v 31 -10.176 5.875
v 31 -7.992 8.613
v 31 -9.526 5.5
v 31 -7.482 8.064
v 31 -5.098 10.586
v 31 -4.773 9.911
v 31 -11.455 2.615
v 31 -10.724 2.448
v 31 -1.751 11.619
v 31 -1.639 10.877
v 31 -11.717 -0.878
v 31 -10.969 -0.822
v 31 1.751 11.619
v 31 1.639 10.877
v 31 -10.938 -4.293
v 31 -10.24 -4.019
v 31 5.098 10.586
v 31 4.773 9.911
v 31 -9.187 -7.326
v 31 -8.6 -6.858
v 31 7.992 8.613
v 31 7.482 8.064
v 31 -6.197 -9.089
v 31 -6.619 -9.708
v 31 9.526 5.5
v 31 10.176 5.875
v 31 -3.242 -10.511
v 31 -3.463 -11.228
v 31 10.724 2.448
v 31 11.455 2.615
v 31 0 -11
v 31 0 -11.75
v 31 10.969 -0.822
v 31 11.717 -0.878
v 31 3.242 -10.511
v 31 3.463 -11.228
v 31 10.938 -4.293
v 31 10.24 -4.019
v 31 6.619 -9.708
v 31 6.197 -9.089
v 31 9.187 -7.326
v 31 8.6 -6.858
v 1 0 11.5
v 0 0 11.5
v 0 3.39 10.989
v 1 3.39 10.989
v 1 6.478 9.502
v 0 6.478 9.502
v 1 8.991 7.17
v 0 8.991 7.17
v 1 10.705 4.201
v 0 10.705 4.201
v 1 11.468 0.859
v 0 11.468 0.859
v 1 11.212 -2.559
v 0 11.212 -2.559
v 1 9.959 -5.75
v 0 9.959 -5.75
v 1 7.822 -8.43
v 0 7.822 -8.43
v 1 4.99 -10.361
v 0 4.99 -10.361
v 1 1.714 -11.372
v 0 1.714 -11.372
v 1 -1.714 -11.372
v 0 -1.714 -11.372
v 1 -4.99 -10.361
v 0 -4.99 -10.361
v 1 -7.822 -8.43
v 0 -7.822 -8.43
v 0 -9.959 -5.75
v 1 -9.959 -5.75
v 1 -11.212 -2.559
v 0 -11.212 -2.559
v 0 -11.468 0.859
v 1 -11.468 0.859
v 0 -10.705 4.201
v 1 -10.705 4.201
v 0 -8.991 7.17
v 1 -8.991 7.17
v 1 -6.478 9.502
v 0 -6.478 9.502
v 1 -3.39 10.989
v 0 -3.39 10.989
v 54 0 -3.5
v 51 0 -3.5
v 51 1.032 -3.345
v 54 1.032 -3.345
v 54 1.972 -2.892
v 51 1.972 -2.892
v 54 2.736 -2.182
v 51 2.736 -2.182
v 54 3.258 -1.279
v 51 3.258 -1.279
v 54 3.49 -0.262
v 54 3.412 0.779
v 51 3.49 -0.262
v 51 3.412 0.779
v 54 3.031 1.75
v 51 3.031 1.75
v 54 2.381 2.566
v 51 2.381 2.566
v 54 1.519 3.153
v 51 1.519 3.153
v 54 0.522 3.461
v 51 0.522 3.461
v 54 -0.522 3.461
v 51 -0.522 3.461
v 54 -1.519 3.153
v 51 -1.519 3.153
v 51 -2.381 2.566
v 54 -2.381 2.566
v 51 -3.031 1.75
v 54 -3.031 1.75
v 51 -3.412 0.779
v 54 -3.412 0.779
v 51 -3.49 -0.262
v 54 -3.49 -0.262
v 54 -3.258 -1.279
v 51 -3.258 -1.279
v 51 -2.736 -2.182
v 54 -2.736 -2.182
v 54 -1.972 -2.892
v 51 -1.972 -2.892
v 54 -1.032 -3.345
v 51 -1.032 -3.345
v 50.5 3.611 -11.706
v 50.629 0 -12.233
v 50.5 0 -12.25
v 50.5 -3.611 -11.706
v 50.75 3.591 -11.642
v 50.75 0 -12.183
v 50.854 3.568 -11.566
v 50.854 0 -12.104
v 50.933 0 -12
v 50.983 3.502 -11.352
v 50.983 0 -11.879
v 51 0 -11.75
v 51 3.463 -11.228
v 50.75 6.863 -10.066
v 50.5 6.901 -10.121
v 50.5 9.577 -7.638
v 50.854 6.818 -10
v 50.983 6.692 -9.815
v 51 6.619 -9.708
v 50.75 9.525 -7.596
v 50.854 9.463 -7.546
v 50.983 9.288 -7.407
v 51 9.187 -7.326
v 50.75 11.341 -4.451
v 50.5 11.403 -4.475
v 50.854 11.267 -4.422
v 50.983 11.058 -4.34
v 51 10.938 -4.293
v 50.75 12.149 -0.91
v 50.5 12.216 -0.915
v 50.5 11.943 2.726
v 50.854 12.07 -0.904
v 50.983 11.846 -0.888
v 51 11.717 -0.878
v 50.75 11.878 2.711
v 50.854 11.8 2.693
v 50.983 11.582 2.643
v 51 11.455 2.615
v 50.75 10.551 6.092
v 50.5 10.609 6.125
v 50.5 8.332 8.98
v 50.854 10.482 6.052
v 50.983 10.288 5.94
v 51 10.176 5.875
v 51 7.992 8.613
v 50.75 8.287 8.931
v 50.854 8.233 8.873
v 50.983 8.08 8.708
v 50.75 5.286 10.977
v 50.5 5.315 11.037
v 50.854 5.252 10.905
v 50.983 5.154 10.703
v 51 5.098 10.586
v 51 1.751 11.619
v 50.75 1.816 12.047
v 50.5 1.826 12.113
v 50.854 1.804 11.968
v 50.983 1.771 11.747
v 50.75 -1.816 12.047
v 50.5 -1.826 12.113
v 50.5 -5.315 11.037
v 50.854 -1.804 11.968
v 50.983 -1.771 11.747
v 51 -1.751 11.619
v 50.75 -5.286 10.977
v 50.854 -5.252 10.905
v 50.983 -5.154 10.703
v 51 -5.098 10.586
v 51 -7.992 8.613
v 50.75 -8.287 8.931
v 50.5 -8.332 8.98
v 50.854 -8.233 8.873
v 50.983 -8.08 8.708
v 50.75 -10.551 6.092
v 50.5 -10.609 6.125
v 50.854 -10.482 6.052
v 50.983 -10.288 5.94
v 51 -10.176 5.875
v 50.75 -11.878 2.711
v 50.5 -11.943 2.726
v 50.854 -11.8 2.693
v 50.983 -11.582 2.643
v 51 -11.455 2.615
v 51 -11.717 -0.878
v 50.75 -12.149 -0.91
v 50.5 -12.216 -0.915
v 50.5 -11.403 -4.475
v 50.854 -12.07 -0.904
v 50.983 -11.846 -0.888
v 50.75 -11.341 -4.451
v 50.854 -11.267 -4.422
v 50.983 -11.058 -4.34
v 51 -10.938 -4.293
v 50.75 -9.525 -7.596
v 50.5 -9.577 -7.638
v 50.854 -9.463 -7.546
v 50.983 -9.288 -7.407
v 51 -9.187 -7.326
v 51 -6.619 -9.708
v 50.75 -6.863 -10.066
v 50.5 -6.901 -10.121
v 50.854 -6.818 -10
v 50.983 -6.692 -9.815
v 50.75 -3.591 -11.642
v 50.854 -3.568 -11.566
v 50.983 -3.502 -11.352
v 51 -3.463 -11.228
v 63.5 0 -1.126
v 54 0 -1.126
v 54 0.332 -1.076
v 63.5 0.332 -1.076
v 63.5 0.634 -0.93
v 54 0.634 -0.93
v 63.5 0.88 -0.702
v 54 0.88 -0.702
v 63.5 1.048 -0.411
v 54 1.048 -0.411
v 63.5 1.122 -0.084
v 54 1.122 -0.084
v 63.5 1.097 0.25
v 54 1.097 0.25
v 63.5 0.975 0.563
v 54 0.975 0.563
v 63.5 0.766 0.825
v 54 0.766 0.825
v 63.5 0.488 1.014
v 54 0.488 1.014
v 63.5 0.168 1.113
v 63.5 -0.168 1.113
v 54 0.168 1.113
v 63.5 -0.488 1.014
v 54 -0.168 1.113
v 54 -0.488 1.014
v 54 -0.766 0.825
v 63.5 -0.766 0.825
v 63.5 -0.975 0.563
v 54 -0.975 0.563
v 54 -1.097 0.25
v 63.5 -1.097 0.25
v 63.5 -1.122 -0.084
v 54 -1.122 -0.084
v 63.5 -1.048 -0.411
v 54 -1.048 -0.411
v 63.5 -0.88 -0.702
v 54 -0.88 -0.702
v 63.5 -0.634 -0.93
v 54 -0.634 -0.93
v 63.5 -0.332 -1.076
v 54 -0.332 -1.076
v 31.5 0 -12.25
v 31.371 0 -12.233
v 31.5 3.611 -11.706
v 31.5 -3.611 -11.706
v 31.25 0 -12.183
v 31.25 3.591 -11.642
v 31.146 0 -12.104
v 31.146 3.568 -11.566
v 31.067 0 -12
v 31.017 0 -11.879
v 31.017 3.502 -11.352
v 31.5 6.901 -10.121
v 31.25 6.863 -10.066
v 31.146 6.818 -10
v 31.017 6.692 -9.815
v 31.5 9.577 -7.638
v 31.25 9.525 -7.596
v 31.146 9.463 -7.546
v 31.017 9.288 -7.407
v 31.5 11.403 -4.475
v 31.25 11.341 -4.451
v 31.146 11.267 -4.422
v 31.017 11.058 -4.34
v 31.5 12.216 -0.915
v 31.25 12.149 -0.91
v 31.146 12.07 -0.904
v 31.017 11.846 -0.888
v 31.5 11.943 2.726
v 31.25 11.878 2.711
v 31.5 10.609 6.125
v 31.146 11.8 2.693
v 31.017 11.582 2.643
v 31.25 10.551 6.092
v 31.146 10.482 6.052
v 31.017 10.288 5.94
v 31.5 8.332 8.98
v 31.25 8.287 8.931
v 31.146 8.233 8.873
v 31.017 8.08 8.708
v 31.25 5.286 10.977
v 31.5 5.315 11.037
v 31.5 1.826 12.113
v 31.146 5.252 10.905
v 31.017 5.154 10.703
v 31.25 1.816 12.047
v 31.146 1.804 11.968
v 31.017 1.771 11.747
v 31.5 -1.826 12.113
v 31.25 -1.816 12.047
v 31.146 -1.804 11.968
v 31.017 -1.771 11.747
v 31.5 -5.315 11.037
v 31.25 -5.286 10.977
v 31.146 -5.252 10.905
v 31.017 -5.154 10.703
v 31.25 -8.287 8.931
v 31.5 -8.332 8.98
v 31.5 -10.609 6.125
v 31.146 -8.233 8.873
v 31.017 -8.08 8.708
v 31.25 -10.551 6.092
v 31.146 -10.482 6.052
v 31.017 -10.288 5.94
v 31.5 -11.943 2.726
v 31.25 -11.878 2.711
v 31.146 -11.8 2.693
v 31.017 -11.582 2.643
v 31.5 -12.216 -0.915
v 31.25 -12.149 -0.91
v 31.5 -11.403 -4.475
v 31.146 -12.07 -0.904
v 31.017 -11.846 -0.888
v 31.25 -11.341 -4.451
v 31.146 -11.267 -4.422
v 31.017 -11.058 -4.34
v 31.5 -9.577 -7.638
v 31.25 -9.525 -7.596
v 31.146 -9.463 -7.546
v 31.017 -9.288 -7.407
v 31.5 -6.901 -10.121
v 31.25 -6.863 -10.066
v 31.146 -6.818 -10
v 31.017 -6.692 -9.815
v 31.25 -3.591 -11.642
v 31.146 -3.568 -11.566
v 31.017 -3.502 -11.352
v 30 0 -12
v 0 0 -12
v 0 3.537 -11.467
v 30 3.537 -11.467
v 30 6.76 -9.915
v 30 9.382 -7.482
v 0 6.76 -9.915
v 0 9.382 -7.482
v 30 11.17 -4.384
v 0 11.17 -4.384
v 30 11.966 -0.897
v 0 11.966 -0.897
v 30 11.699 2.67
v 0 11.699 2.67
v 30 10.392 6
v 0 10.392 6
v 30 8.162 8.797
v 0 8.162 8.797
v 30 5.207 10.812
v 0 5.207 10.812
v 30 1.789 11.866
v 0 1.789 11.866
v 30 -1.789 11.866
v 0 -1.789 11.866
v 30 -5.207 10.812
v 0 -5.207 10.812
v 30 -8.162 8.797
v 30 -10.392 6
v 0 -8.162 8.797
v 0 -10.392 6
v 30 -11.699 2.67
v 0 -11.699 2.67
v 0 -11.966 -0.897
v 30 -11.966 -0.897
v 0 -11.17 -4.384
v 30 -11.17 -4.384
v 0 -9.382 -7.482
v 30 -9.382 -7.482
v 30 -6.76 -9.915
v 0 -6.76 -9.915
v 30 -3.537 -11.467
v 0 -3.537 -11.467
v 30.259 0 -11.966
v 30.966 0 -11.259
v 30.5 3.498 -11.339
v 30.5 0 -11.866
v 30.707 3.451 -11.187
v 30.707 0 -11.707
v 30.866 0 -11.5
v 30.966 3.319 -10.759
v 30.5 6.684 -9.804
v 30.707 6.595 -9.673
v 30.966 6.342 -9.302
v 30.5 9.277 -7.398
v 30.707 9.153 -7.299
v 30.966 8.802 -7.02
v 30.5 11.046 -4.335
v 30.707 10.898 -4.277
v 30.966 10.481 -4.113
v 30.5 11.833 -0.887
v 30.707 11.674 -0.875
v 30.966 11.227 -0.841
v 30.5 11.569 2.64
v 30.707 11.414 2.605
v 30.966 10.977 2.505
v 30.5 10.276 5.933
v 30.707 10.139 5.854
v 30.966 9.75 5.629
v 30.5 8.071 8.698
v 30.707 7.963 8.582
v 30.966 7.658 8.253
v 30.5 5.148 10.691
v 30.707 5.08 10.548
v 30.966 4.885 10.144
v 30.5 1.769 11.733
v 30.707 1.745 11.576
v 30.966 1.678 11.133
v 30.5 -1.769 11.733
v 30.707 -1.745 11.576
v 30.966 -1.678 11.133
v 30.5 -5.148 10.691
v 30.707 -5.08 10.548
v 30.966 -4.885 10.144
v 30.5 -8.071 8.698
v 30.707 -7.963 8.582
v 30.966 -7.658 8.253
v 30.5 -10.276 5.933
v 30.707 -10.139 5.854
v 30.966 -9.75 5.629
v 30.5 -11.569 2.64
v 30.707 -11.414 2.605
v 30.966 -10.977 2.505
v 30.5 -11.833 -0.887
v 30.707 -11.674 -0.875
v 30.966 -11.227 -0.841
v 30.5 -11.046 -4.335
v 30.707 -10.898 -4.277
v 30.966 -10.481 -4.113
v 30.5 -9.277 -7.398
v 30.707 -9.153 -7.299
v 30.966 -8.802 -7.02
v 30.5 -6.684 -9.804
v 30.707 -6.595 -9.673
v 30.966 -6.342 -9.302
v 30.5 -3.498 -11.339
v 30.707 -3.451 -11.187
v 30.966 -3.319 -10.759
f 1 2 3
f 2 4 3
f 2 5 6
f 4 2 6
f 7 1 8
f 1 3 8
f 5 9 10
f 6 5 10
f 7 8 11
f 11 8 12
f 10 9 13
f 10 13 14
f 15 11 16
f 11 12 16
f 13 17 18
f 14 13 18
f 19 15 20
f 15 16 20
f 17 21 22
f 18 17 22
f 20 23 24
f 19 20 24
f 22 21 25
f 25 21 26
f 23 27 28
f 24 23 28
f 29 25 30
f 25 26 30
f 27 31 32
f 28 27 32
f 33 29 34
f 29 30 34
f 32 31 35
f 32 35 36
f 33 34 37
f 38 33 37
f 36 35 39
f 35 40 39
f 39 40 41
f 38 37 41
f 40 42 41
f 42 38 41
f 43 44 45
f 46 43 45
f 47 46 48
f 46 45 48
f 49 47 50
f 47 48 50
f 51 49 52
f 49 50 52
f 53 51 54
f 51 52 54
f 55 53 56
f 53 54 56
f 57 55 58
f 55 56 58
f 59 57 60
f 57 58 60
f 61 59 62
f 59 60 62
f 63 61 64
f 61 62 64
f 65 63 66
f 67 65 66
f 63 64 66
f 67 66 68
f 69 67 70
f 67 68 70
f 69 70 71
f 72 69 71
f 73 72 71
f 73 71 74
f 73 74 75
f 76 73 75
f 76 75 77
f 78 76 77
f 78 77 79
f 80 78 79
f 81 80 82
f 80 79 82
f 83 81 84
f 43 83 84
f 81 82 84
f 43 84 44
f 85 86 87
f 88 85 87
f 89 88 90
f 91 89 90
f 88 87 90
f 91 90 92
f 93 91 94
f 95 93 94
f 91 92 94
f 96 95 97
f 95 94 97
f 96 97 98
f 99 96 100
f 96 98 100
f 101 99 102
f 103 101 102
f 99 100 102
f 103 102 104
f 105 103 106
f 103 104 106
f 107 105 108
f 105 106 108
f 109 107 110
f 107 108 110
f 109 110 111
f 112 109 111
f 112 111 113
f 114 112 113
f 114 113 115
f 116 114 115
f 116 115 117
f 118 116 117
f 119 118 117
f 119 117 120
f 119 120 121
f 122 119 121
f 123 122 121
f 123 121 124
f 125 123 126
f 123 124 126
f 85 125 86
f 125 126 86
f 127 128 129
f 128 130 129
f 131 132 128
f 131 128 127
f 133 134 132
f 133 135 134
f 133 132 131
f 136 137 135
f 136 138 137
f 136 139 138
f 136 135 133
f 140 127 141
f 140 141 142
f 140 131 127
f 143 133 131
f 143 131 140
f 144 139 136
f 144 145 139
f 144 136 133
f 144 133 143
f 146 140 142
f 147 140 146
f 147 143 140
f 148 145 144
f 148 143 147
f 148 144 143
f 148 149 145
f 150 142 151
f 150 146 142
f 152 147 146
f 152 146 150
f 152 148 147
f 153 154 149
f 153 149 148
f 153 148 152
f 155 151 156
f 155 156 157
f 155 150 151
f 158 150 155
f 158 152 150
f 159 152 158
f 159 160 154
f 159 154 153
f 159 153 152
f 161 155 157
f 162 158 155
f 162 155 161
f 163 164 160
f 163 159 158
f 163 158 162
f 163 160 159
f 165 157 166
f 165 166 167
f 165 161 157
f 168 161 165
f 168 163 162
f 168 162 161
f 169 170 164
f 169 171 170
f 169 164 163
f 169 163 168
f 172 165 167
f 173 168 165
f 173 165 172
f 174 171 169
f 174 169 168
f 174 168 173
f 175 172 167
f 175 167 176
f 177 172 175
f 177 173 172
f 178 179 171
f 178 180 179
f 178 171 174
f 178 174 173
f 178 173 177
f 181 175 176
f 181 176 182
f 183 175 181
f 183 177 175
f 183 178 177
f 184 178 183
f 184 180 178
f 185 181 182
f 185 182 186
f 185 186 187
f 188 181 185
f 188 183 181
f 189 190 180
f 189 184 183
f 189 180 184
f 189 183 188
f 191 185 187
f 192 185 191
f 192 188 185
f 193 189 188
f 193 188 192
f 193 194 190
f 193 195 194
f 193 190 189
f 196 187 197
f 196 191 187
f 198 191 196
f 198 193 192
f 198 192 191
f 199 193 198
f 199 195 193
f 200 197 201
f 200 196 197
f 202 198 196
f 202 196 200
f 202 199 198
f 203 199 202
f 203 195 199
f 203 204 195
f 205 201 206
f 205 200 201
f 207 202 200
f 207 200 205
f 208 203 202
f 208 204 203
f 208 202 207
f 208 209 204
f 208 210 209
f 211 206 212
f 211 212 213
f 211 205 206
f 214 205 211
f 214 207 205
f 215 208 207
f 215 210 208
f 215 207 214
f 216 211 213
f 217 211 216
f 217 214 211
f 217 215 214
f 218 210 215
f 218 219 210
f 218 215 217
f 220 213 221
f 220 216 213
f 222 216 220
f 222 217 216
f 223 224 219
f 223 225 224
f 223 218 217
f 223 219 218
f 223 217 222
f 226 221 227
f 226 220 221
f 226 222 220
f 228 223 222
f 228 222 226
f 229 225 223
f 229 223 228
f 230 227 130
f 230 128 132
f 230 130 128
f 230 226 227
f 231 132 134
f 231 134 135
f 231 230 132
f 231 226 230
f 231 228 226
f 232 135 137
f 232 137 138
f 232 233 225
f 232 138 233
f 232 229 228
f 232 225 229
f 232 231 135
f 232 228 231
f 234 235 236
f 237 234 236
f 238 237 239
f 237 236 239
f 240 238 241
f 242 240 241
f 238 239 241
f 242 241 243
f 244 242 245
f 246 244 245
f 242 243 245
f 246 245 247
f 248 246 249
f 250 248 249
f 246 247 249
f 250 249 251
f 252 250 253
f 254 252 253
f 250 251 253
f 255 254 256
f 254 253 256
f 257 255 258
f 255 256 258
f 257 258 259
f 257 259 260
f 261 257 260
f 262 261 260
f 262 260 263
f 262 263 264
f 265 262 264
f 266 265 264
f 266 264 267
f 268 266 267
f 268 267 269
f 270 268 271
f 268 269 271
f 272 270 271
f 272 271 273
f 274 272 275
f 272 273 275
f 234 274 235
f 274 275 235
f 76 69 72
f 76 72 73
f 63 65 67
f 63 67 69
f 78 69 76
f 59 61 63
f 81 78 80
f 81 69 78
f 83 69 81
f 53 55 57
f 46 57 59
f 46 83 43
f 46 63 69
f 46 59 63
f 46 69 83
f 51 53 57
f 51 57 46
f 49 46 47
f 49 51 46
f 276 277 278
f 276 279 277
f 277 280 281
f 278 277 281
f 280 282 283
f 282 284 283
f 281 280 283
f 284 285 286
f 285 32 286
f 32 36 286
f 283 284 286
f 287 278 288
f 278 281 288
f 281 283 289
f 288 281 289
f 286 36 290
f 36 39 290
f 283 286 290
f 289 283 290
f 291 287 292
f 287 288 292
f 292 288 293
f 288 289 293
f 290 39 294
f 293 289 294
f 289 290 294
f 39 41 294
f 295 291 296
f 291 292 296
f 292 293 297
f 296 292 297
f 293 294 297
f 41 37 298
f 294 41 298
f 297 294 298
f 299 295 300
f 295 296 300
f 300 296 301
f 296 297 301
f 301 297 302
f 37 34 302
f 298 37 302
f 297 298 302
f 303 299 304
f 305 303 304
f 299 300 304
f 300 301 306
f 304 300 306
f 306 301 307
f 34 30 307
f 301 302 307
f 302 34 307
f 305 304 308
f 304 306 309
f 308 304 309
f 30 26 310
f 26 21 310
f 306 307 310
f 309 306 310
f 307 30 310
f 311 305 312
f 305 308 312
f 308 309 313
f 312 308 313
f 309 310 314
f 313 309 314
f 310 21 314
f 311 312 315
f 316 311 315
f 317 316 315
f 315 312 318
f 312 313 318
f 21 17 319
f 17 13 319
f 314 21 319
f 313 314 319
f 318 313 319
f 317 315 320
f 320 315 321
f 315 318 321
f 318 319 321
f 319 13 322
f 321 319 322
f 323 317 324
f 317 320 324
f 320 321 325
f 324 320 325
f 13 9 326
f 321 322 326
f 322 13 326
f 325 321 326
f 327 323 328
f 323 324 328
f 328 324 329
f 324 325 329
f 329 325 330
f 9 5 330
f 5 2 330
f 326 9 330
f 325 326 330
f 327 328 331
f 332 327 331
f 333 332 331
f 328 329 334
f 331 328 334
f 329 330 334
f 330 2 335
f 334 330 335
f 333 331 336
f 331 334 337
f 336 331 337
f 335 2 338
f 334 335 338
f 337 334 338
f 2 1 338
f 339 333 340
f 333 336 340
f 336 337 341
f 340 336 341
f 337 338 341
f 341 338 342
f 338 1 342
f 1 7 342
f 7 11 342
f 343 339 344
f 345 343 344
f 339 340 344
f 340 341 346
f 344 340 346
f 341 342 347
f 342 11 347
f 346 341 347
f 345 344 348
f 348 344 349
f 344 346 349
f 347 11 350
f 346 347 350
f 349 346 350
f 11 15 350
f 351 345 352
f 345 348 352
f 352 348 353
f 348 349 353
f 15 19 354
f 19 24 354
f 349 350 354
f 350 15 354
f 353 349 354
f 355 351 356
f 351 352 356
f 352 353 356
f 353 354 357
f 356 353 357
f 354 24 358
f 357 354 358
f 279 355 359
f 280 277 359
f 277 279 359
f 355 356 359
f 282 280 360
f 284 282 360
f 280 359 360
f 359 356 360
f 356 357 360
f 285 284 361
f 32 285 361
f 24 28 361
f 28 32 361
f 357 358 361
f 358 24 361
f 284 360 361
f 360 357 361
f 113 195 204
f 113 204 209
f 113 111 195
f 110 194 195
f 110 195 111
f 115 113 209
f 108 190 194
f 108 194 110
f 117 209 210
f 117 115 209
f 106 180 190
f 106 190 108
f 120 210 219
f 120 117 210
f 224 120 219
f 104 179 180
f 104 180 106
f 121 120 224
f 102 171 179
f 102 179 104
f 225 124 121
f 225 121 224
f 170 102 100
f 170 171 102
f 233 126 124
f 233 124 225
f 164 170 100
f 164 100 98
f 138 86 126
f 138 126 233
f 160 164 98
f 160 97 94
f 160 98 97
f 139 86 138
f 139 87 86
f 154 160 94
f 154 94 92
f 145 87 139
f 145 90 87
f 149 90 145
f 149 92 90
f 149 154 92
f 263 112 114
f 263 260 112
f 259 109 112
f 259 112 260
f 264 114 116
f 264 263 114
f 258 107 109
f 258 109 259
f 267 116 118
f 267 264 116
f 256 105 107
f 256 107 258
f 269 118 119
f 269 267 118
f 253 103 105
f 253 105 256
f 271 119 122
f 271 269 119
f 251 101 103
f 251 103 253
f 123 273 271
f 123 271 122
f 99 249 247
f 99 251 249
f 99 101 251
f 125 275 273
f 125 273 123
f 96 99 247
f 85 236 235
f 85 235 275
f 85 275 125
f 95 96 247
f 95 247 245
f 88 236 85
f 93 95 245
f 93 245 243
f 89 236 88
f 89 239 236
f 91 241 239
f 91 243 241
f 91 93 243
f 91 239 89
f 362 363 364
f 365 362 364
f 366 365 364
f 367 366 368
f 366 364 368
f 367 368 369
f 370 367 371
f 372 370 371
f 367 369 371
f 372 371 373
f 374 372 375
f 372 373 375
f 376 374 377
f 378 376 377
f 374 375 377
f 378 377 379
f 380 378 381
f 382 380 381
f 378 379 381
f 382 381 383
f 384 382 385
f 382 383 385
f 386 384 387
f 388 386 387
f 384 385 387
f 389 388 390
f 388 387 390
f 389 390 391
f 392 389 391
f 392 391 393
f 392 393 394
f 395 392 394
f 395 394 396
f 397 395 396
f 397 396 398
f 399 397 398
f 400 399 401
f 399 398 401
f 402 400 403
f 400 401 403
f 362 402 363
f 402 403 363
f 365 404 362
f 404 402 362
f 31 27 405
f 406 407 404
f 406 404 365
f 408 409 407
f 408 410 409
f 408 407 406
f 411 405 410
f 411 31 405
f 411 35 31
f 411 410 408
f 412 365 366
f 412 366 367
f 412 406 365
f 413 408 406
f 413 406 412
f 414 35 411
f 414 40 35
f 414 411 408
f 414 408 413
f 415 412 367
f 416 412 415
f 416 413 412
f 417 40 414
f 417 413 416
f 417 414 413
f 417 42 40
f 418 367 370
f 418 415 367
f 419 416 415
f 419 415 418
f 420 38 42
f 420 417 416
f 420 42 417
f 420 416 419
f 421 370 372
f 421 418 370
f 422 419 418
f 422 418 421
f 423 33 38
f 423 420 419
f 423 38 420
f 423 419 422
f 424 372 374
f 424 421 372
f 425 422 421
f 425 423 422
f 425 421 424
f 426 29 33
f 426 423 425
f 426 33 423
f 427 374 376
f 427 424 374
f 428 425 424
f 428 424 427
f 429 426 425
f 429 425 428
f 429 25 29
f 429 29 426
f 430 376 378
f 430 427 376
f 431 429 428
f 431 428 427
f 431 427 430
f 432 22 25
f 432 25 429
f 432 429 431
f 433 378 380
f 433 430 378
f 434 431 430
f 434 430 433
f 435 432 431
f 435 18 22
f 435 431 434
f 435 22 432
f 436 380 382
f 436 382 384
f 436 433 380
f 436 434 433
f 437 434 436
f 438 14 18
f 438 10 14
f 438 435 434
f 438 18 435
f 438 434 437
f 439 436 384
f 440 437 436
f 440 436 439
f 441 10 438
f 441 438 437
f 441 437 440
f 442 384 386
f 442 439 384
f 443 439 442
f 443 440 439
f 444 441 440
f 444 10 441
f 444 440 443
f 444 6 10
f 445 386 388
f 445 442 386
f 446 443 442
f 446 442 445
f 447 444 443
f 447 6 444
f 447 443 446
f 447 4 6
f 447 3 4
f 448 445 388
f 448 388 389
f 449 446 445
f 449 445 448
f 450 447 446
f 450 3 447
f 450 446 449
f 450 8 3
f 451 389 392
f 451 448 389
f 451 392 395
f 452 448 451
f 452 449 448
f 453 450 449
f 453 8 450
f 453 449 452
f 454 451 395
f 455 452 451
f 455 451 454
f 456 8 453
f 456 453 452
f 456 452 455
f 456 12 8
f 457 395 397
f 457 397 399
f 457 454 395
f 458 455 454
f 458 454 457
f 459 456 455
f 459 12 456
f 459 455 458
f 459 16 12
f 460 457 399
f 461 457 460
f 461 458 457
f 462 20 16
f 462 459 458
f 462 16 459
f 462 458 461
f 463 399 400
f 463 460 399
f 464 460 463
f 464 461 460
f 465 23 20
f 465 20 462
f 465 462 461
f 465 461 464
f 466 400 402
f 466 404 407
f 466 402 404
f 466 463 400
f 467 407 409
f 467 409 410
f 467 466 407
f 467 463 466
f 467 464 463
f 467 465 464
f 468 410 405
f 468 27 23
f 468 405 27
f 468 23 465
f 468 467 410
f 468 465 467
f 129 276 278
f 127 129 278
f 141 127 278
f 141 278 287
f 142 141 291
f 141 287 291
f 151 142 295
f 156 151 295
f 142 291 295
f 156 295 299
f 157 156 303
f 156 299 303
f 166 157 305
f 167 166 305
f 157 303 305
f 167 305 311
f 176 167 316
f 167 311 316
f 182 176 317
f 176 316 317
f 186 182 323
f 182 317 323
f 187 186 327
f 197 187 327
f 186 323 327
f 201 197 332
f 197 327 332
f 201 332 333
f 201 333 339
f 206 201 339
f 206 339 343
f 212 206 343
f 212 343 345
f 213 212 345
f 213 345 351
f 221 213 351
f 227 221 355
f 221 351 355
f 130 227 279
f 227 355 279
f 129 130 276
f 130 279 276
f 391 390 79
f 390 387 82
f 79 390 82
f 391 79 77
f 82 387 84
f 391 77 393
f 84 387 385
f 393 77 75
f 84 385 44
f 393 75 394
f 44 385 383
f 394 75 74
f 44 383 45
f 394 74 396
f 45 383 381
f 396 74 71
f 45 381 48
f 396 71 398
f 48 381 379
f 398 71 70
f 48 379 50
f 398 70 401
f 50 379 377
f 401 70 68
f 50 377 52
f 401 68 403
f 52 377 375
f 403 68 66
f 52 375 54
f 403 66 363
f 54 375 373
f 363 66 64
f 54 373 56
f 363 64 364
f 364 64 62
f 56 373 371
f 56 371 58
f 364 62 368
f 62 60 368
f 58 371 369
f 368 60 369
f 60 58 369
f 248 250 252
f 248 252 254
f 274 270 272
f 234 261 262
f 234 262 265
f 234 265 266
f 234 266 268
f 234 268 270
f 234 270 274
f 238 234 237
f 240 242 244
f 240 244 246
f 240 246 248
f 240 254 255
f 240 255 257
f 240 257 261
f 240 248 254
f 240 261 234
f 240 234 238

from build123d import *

# Parameters (mm, degrees)
SKETCH1_R           = 12
BOSS_EXTRUDE1_DEPTH = 31
FILLET1_R           = 1
SKETCH2_R           = 11.5
CUT_EXTRUDE1_DEPTH  = 1
SKETCH3_R           = 12.25
BOSS_EXTRUDE2_DEPTH = 20
FILLET2_R           = 0.5
SKETCH4_R           = 3.5
BOSS_EXTRUDE3_DEPTH = 3
SKETCH5_R           = 1.125510402
BOSS_EXTRUDE4_DEPTH = 9.5


with BuildPart() as part:
    # Sketch1 → Boss-Extrude1 (new body)
    with BuildSketch(Plane(origin=(0, 0, 0), x_dir=(0, 0, -1), z_dir=(1, 0, 0))):
        Circle(SKETCH1_R)
    extrude(amount=BOSS_EXTRUDE1_DEPTH)

    # Fillet1
    fillet1_edges = [part.edges().sort_by_distance(p)[0] for p in [
        (31, 0, 12),
    ]]
    fillet(fillet1_edges, radius=FILLET1_R)

    # Sketch2 → Cut-Extrude1 (cut)
    with BuildSketch(Plane.ZY):
        Circle(SKETCH2_R)
    extrude(amount=-CUT_EXTRUDE1_DEPTH, mode=Mode.SUBTRACT)

    # Sketch3 → Boss-Extrude2 (add)
    with BuildSketch(Plane(origin=(31, 0, 0), x_dir=(0, 0, -1), z_dir=(1, 0, 0))):
        Circle(SKETCH3_R)
    extrude(amount=BOSS_EXTRUDE2_DEPTH)

    # Fillet2
    fillet2_edges = [part.edges().sort_by_distance(p)[0] for p in [
        (31, 0, 12.25),
        (51, 0, 12.25),
    ]]
    fillet(fillet2_edges, radius=FILLET2_R)

    # Sketch4 → Boss-Extrude3 (add)
    with BuildSketch(Plane(origin=(51, 0, 0), x_dir=(0, 0, -1), z_dir=(1, 0, 0))):
        Circle(SKETCH4_R)
    extrude(amount=BOSS_EXTRUDE3_DEPTH)

    # Sketch5 → Boss-Extrude4 (add)
    with BuildSketch(Plane(origin=(54, 0, 0), x_dir=(0, 0, -1), z_dir=(1, 0, 0))):
        Circle(SKETCH5_R)
    extrude(amount=BOSS_EXTRUDE4_DEPTH)


solid = part.part
